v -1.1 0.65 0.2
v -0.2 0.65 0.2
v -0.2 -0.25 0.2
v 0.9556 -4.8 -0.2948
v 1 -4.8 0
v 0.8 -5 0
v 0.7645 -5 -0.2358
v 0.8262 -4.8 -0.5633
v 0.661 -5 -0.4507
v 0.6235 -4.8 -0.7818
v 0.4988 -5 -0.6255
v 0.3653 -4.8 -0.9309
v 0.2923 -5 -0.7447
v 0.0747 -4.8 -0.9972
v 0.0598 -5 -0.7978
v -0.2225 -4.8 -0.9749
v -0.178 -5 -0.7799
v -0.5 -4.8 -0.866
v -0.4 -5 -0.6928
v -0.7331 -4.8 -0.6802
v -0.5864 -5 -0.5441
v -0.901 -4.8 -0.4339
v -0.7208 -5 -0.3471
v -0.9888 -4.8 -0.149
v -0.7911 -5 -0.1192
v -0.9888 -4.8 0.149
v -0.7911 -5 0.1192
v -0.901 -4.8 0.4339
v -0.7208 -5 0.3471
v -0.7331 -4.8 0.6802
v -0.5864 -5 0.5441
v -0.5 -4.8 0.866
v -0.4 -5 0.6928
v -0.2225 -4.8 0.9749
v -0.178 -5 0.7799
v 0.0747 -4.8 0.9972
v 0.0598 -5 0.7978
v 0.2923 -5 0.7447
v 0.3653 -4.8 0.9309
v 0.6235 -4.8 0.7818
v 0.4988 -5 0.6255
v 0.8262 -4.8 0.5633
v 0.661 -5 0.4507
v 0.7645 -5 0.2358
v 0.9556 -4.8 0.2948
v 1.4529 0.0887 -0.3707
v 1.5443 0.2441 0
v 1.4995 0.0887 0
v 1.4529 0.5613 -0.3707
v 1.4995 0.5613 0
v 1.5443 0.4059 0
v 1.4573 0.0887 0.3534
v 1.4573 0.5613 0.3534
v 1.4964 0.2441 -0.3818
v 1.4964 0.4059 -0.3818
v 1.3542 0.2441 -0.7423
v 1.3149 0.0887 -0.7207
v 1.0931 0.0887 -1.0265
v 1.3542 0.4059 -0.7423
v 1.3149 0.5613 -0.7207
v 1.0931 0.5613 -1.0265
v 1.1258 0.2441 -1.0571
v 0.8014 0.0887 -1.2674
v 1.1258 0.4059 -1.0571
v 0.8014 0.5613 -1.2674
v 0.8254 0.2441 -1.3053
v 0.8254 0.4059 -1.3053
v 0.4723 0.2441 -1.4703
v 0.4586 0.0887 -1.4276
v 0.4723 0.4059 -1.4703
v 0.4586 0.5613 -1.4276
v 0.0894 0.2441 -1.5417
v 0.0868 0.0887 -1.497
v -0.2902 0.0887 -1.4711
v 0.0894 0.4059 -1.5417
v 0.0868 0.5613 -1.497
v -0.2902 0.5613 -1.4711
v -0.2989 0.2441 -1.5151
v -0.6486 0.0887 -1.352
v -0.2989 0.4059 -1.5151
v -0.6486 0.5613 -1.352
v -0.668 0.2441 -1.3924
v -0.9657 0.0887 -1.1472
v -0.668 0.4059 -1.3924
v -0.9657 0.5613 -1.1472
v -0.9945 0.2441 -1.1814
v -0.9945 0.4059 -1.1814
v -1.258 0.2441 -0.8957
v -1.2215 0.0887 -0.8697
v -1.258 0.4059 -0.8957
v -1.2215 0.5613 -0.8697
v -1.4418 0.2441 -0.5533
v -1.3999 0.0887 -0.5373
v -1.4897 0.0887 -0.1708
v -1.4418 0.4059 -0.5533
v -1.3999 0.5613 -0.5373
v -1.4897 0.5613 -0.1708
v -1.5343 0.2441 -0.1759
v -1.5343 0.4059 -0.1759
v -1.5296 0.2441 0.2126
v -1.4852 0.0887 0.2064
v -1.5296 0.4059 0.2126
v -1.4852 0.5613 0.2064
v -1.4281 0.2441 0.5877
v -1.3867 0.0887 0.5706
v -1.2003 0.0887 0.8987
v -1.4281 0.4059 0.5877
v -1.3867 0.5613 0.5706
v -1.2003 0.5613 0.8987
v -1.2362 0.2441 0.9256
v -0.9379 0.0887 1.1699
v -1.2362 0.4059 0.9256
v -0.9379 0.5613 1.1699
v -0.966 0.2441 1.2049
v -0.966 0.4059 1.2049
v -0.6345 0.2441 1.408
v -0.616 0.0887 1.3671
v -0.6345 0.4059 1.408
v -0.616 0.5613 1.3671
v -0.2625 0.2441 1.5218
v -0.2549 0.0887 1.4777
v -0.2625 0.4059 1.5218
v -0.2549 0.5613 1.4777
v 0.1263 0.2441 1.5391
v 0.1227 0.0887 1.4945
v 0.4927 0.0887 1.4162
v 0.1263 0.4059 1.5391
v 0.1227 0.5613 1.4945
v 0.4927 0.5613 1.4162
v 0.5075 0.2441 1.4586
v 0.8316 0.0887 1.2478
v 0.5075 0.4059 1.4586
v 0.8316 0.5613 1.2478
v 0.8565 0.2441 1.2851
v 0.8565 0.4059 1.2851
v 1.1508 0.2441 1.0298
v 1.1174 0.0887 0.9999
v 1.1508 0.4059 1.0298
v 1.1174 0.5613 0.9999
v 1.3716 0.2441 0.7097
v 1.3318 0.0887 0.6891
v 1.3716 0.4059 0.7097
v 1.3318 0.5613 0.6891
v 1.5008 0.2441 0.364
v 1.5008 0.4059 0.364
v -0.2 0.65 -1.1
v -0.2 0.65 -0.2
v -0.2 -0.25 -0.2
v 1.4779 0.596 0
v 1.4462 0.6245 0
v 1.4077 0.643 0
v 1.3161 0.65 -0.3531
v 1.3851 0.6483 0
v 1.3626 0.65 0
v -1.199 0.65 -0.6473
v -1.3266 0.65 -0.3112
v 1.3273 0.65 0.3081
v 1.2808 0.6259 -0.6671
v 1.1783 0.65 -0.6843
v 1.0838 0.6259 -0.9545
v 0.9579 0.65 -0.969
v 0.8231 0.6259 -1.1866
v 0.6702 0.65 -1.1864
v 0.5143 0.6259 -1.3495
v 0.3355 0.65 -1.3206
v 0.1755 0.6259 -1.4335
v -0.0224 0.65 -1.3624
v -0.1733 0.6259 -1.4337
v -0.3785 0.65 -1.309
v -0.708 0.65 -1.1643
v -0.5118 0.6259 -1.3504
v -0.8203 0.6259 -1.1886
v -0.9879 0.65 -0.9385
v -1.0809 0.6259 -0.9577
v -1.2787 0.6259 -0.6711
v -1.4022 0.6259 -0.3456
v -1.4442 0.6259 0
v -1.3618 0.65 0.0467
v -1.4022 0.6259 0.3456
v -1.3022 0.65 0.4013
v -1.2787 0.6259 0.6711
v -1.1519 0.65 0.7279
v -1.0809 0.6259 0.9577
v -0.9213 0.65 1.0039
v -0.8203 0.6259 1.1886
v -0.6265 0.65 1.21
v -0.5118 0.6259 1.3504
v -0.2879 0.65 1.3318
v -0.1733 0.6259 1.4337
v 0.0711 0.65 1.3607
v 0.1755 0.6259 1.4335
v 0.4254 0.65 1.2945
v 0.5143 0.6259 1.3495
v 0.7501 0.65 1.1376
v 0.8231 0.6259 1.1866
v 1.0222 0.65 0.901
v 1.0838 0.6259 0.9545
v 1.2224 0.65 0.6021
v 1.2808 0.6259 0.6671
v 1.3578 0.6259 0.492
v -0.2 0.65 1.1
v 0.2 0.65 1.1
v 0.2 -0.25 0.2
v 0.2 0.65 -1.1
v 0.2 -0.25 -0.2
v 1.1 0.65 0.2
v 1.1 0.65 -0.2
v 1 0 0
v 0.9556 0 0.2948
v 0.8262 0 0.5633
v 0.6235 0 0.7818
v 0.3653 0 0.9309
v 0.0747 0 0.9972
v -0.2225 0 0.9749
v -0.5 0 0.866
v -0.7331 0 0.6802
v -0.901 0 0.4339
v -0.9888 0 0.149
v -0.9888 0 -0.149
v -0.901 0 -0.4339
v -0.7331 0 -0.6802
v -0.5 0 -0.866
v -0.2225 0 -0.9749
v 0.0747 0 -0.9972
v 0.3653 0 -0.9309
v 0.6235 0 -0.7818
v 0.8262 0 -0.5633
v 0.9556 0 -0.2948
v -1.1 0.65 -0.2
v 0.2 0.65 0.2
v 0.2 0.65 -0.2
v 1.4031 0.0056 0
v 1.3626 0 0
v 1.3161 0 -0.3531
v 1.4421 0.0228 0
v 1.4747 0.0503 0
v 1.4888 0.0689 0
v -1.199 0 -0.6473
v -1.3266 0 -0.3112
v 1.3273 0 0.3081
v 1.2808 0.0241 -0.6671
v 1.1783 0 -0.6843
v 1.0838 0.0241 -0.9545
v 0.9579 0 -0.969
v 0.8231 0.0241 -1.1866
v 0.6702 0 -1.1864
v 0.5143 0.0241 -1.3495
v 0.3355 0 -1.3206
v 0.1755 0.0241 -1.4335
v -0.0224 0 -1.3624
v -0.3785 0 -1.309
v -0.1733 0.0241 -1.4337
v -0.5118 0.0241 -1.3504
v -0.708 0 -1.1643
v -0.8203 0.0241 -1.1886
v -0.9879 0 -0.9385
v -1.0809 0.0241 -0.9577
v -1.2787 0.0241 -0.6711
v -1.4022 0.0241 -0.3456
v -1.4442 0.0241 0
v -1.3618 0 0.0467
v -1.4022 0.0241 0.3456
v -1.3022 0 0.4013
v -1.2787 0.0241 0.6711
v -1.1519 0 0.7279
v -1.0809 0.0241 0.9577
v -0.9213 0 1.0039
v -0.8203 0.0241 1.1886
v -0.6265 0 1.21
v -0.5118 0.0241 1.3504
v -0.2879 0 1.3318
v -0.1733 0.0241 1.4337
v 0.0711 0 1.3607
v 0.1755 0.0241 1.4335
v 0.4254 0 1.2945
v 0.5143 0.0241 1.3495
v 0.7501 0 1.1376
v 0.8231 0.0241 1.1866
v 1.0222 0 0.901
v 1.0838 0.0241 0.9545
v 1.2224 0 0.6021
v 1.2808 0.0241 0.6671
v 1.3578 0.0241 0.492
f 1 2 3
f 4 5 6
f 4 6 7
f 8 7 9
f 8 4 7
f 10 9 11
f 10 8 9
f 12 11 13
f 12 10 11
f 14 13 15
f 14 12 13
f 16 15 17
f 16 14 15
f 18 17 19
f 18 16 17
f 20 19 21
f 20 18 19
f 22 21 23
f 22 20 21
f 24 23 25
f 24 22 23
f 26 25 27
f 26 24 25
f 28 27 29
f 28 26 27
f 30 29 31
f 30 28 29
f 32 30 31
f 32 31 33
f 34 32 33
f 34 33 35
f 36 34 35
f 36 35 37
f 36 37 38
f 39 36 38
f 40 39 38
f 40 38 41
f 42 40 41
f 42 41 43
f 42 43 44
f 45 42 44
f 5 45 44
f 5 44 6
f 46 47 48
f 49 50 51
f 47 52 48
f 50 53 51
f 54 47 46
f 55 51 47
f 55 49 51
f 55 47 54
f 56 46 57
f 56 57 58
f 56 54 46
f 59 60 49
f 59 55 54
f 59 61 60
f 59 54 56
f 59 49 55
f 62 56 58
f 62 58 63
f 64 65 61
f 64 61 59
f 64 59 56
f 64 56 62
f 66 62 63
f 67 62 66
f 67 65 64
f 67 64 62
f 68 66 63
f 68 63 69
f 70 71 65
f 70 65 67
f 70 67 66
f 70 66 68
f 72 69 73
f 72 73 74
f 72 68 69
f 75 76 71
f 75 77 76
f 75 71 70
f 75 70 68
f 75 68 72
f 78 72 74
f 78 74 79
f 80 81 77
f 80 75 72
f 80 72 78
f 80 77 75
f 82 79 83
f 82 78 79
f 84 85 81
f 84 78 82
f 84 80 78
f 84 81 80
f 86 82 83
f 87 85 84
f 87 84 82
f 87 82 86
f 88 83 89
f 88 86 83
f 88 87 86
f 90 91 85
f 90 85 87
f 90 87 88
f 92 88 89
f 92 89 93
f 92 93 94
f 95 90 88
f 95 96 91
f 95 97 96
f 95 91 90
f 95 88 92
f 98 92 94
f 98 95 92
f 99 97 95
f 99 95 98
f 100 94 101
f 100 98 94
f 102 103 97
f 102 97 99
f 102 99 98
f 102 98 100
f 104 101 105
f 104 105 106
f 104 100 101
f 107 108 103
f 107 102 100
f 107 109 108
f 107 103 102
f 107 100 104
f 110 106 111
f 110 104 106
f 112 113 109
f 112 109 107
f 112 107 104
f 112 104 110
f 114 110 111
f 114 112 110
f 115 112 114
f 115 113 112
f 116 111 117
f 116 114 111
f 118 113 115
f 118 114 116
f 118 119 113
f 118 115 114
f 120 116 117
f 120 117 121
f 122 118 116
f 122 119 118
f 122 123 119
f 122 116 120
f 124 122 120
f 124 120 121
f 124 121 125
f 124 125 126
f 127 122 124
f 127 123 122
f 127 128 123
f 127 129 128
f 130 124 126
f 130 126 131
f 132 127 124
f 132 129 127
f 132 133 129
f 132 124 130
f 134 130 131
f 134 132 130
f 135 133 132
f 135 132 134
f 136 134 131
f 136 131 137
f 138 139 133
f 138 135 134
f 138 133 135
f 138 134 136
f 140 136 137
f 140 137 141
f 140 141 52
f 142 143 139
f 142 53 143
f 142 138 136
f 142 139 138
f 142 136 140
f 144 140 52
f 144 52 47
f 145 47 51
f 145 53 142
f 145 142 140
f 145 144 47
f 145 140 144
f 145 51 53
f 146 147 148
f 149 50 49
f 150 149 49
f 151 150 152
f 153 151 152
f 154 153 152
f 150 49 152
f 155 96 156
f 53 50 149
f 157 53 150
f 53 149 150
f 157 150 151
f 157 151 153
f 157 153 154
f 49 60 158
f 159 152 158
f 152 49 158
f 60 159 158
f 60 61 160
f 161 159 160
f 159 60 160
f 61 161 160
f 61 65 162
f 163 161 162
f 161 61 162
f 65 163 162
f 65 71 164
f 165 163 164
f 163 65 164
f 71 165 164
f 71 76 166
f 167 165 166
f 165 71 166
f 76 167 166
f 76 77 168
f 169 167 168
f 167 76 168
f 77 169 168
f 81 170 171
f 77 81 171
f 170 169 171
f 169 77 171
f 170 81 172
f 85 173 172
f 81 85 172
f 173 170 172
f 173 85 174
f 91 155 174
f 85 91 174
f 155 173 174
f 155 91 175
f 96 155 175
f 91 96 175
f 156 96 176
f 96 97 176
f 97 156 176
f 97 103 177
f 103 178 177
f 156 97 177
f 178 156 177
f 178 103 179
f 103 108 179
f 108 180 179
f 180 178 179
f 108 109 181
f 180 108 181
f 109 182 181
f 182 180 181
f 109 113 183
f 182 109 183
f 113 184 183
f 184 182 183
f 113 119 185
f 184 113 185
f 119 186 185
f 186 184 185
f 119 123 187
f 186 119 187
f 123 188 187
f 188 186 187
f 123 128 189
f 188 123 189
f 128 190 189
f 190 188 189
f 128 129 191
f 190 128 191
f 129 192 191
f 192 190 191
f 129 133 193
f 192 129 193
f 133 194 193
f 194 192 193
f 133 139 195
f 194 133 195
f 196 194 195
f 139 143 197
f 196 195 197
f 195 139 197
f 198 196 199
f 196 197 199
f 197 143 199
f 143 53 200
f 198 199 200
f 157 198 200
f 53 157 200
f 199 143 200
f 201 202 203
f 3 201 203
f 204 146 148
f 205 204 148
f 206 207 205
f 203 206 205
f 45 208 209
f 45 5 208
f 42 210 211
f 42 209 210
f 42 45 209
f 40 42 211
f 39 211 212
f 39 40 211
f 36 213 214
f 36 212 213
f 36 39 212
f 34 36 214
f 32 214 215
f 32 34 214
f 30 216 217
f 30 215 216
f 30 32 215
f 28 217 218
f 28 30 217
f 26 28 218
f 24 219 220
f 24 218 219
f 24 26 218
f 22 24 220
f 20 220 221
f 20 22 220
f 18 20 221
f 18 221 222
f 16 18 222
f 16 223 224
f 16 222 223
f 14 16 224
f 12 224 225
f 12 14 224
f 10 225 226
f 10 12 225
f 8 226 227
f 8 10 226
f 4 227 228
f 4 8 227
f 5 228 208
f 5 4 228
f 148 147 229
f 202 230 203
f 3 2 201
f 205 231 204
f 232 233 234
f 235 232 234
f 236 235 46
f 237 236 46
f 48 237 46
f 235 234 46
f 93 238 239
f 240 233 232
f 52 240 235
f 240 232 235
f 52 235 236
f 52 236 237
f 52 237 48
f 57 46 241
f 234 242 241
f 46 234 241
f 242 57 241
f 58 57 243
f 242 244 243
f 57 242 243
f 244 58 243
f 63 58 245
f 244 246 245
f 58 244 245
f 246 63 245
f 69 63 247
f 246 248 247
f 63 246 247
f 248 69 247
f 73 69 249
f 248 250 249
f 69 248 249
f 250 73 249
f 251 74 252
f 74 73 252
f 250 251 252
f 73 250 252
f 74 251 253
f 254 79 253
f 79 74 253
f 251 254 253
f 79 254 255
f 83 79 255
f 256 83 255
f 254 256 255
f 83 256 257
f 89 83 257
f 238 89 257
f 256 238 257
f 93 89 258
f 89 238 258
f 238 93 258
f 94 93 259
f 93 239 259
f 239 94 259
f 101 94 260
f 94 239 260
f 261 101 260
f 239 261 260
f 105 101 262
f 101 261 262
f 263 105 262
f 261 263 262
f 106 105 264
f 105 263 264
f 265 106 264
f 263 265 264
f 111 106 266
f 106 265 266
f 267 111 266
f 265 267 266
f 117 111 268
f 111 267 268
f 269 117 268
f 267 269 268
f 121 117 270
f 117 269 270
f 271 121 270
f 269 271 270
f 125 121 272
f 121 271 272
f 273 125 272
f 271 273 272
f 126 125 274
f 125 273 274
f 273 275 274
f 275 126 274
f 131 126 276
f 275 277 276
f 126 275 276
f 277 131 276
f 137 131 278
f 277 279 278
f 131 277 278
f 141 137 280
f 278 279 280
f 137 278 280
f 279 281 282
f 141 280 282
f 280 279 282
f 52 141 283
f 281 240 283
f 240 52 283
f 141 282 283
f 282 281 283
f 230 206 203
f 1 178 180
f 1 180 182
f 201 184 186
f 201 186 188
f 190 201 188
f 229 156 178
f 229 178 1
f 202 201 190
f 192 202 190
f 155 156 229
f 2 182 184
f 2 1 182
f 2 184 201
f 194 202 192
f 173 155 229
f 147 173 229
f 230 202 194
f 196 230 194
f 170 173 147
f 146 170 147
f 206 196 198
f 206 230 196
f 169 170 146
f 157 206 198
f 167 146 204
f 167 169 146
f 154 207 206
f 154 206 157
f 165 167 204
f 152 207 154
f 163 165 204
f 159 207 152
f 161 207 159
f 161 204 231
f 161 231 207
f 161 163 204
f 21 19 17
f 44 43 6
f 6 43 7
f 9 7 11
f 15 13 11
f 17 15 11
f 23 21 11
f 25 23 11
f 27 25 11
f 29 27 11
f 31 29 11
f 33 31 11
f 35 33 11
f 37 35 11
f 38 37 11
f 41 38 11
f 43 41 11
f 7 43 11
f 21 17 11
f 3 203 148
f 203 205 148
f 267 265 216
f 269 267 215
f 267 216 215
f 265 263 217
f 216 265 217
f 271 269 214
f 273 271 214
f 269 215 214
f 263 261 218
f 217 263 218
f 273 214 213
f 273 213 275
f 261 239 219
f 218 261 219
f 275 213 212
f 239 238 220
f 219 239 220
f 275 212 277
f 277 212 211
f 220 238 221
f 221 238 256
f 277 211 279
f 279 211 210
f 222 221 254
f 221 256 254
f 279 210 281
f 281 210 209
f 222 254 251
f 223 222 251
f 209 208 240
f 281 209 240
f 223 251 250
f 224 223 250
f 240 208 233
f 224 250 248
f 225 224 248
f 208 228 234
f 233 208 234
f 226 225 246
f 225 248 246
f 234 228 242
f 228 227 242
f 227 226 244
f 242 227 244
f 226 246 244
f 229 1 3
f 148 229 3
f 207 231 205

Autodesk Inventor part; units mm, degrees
ref_plane "YZ Plane" through (0, 0, 0) normal (1, 0, 0) x (0, 1, 0)
ref_plane "XZ Plane" through (0, 0, 0) normal (0, 1, 0) x (-1, 0, 0)
ref_plane "XY Plane" through (0, 0, 0) normal (0, 0, 1) x (1, 0, 0)
sketch "スケッチ1" plane through (0, 0, 0) normal (0, 0, 1) x (1, 0, 0)
  line L0 (0, 0) -> (0, 5.2414) construction
  line L1 (1.45, 0.65) -> (1.45, 0) construction
  line L2 (1.45, 0) -> (1, 0)
  line L3 (1, 0) -> (1, -5)
  line L4 (1, -5) -> (0, -5)
  line L5 (0, -5) -> (0, 0)
  line L6 (0, 0) -> (0, 0.65)
  line L7 (1.45, 0.65) -> (0, 0.65)
  arc A0 (1.45, 0) -> (1.45, 0.65) centre (0.9719, 0.325) ccw
  line L8 (1.55, 1.278) -> (1.55, -0.8189) construction
  dimension "d0" = 2
  dimension "d1" = 5
  dimension "d2" = 3.1
  dimension "d3" = 0.1
  dimension "d4" = 0.65
revolve "回転1" add sketch "スケッチ1" angle 360 about axis through (0, 0, 0) along (0, 1, 0)
sketch "スケッチ2" plane through (0, 0, 0) normal (0, 0, 1) x (1, 0, 0)
  line L0 (-1.45, 0.65) -> (1.45, 0.65) construction
  line L1 (1.1, 0.65) -> (0.2, -0.25)
  line L2 (0.2, -0.25) -> (0, -0.25)
  line L3 (0, -0.25) -> (0, 0.65)
  line L4 (0, 0) -> (0, -0.4614) construction
  line L5 (0, 0.65) -> (1.1, 0.65)
  dimension "d6" = 45
  dimension "d8" = 0.2
  dimension "d15" = 2.2
extrude "押し出し1" cut sketch "スケッチ2" along normal mid plane 0.4
pattern_circular "円形状パターン1" count 4 over 360 about axis through (0, -10, 0) along (0, 1, 0) of "押し出し1"
chamfer "面取り1" distance 0.2 angle 45 1 edges at (-1, -5, 0)
fillet "フィレット2" radius 0.15 2 edges at (-1.45, 0.65, 0) (-1.45, 0, 0)
properties part number "10_047_LOW_HEAD_SCREW_M2X5_R1" material "ステンレス鋼"
